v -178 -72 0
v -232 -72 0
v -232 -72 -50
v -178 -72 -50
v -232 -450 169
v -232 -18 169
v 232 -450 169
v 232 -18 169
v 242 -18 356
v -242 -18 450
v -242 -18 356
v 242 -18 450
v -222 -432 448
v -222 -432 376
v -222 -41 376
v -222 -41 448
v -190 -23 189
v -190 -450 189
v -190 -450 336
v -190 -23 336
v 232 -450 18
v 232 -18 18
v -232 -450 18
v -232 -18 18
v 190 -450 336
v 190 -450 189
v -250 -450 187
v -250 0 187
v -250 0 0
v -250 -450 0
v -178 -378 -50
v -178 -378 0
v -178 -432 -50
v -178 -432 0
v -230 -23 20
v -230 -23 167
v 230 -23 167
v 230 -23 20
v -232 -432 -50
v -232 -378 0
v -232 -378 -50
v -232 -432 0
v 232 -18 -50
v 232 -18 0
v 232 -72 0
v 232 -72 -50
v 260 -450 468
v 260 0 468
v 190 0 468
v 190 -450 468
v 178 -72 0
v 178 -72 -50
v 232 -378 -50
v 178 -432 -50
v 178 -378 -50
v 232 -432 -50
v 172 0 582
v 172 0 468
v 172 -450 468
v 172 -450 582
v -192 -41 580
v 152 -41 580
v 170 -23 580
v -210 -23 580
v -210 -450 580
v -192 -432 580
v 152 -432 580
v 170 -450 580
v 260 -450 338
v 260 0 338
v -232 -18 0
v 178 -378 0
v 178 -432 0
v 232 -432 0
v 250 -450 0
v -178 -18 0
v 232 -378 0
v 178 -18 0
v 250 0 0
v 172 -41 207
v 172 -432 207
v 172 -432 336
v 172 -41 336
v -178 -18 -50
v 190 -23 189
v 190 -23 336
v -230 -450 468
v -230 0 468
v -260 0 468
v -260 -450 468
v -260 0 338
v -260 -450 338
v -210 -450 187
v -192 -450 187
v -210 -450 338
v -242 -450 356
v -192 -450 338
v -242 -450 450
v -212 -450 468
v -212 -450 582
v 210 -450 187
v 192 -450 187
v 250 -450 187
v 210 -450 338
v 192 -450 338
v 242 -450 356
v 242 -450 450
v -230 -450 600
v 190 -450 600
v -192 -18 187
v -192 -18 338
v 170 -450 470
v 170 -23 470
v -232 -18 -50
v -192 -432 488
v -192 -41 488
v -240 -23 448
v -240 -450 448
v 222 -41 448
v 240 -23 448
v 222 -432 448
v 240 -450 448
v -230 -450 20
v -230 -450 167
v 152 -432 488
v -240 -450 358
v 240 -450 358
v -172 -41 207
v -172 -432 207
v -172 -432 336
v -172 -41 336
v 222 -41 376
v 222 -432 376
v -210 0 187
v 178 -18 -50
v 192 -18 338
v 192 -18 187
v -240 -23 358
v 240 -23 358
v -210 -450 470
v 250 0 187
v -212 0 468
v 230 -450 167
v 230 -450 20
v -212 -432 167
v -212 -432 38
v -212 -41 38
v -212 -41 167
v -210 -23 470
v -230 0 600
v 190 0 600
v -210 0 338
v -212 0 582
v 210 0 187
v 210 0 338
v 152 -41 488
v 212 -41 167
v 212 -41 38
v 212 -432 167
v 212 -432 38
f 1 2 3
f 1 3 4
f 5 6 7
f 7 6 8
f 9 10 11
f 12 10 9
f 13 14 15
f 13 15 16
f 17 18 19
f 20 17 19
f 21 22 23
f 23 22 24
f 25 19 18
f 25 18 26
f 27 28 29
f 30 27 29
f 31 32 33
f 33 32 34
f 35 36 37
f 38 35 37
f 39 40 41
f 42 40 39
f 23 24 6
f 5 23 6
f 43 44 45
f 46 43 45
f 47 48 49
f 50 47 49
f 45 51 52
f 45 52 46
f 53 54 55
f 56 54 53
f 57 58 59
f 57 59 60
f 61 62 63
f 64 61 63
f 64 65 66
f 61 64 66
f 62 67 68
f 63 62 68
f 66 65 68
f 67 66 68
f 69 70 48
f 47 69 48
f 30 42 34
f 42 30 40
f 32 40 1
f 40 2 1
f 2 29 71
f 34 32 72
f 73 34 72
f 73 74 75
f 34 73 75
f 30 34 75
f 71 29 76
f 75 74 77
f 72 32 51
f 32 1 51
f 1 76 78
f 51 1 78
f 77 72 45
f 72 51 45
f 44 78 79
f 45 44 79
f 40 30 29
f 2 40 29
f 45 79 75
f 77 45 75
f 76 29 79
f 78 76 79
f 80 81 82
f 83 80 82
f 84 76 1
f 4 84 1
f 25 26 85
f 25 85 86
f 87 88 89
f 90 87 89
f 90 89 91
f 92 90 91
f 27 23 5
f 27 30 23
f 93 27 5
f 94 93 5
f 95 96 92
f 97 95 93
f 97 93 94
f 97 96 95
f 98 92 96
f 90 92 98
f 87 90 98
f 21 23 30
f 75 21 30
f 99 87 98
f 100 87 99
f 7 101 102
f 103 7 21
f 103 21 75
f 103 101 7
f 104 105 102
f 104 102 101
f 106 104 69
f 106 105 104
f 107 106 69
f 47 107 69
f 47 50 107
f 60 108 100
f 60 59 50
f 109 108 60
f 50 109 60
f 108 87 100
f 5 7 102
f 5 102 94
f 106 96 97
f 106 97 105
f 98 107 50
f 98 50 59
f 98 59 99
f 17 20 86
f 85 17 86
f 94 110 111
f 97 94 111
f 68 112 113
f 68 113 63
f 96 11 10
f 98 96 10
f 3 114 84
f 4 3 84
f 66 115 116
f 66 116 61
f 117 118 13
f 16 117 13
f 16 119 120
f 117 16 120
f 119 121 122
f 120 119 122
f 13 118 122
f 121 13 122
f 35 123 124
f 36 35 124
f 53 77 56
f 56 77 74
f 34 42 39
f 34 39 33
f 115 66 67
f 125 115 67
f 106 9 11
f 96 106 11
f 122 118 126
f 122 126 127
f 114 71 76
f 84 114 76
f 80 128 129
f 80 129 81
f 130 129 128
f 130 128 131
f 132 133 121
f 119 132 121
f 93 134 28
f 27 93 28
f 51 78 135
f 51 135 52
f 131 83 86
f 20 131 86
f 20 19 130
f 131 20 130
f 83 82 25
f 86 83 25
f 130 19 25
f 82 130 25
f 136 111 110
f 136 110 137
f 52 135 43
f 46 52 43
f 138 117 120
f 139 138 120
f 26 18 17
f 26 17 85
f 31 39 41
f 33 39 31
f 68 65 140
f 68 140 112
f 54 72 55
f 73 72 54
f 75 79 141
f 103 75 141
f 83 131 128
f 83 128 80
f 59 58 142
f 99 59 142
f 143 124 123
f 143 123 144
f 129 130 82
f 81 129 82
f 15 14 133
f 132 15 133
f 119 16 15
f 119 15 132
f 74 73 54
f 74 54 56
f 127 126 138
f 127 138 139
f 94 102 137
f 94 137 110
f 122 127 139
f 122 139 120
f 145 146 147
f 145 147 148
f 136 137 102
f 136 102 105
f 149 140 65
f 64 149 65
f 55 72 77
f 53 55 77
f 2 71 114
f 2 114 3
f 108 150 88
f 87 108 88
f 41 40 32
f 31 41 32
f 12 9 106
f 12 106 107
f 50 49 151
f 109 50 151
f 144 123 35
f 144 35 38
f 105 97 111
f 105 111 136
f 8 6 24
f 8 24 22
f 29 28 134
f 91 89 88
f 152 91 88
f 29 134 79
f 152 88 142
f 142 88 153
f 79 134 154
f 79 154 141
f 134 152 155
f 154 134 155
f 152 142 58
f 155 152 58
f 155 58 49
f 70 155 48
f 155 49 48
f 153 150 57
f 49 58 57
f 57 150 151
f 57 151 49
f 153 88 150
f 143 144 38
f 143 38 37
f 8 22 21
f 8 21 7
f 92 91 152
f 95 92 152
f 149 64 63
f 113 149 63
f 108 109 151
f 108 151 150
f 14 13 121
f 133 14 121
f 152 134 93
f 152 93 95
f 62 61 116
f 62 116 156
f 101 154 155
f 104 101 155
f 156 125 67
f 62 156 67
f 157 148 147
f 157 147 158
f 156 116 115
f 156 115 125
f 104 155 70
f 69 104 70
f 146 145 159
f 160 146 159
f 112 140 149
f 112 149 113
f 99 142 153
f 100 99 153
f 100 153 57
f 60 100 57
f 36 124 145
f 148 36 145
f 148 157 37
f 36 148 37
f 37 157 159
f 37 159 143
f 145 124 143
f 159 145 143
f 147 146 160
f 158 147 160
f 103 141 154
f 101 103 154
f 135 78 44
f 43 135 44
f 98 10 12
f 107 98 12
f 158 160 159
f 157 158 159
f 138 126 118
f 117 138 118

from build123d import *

# Parameters (mm, degrees)
F0_W     = 18
F0_H     = 114
F0_H_2   = 94
F0_H_3   = 151
F1_DEPTH = 450
F0_W_2   = 484
F0_W_3   = 384
F0_W_4   = 464
F2_DEPTH = 18
F3_W     = 480
F3_H     = 90
F4_DEPTH = 427
F3_W_2   = 380
F3_H_2   = 147
F3_W_3   = 460
F3_H_3   = 110
F5_T     = -18
F6_T     = -18
F7_T     = -18
F8_W     = 54
F8_H     = 54
F9_DEPTH = 50
F10_T    = -18


with BuildPart() as f1:
    # F0 (on Front) → F1 (new body)
    with BuildSketch(Plane.XZ):
        Polygon((-230, 468), (-260, 468), (-260, 450), (-242, 450), (242, 450), (260, 450), (260, 468), (190, 468), (172, 468), (-212, 468), align=None)
        with Locations((-221, 525)):
            Rectangle(F0_W, F0_H)
        with Locations((-251, 403)):
            Rectangle(F0_W, F0_H_2)
        Polygon((-230, 600), (-230, 582), (-212, 582), (172, 582), (190, 582), (190, 600), align=None)
        Polygon((-242, 356), (-260, 356), (-260, 338), (-210, 338), (-192, 338), (192, 338), (210, 338), (260, 338), (260, 356), (242, 356), align=None)
        with Locations((181, 525)):
            Rectangle(F0_W, F0_H)
        with Locations((251, 403)):
            Rectangle(F0_W, F0_H_2)
        with Locations((-201, 262.5)):
            Rectangle(F0_W, F0_H_3)
        Polygon((-192, 187), (-210, 187), (-250, 187), (-250, 169), (-232, 169), (232, 169), (250, 169), (250, 187), (210, 187), (192, 187), align=None)
        with Locations((201, 262.5)):
            Rectangle(F0_W, F0_H_3)
        with Locations((-241, 93.5)):
            Rectangle(F0_W, F0_H_3)
        Polygon((-232, 18), (-250, 18), (-250, 0), (250, 0), (250, 18), (232, 18), align=None)
        with Locations((241, 93.5)):
            Rectangle(F0_W, F0_H_3)
    extrude(amount=F1_DEPTH)

    # F0 (on Front) → F2 (join)
    with BuildSketch(Plane.XZ):
        with Locations((0, 403)):
            Rectangle(F0_W_2, F0_H_2)
        with Locations((0, 262.5)):
            Rectangle(F0_W_3, F0_H_3)
        with Locations((0, 93.5)):
            Rectangle(F0_W_4, F0_H_3)
    extrude(amount=F2_DEPTH)

    # F8 (on face) → F9 (join)
    with BuildSketch(Plane(origin=(0, 0, 0), x_dir=(1, 0, 0), z_dir=(0, 0, -1))):
        with Locations((-205, 405)):
            Rectangle(F8_W, F8_H)
        with Locations((205, 405)):
            Rectangle(F8_W, F8_H)
        with Locations((-205, 45)):
            Rectangle(F8_W, F8_H)
        with Locations((205, 45)):
            Rectangle(F8_W, F8_H)
    extrude(amount=F9_DEPTH)


with BuildPart() as f4:
    # F3 (on face) → F4 (new body, through all)
    with BuildSketch(Plane.XZ.offset(450)):
        with Locations((0, 403)):
            Rectangle(F3_W, F3_H)
    extrude(amount=-F4_DEPTH)

    # F5
    f5_openings = [f4.faces().sort_by_distance(p)[0] for p in [
        (0, -236.5, 448),
    ]]
    offset(amount=F5_T, openings=f5_openings)


with BuildPart() as f4b:
    # F3 (on face) → F4, piece 2 (new body, through all)
    with BuildSketch(Plane.XZ.offset(450)):
        with Locations((0, 262.5)):
            Rectangle(F3_W_2, F3_H_2)
    extrude(amount=-F4_DEPTH)

    # F6
    f6_openings = [f4b.faces().sort_by_distance(p)[0] for p in [
        (0, -236.5, 336),
    ]]
    offset(amount=F6_T, openings=f6_openings)


with BuildPart() as f4c:
    # F3 (on face) → F4, piece 3 (new body, through all)
    with BuildSketch(Plane.XZ.offset(450)):
        with Locations((0, 93.5)):
            Rectangle(F3_W_3, F3_H_2)
    extrude(amount=-F4_DEPTH)

    # F7
    f7_openings = [f4c.faces().sort_by_distance(p)[0] for p in [
        (0, -236.5, 167),
    ]]
    offset(amount=F7_T, openings=f7_openings)


with BuildPart() as f4d:
    # F3 (on face) → F4, piece 4 (new body, through all)
    with BuildSketch(Plane.XZ.offset(450)):
        with Locations((-20, 525)):
            Rectangle(F3_W_2, F3_H_3)
    extrude(amount=-F4_DEPTH)

    # F10
    f10_openings = [f4d.faces().sort_by_distance(p)[0] for p in [
        (-20, -236.5, 580),
    ]]
    offset(amount=F10_T, openings=f10_openings)


solid = Compound([f1.part, f4.part, f4b.part, f4c.part, f4d.part])
